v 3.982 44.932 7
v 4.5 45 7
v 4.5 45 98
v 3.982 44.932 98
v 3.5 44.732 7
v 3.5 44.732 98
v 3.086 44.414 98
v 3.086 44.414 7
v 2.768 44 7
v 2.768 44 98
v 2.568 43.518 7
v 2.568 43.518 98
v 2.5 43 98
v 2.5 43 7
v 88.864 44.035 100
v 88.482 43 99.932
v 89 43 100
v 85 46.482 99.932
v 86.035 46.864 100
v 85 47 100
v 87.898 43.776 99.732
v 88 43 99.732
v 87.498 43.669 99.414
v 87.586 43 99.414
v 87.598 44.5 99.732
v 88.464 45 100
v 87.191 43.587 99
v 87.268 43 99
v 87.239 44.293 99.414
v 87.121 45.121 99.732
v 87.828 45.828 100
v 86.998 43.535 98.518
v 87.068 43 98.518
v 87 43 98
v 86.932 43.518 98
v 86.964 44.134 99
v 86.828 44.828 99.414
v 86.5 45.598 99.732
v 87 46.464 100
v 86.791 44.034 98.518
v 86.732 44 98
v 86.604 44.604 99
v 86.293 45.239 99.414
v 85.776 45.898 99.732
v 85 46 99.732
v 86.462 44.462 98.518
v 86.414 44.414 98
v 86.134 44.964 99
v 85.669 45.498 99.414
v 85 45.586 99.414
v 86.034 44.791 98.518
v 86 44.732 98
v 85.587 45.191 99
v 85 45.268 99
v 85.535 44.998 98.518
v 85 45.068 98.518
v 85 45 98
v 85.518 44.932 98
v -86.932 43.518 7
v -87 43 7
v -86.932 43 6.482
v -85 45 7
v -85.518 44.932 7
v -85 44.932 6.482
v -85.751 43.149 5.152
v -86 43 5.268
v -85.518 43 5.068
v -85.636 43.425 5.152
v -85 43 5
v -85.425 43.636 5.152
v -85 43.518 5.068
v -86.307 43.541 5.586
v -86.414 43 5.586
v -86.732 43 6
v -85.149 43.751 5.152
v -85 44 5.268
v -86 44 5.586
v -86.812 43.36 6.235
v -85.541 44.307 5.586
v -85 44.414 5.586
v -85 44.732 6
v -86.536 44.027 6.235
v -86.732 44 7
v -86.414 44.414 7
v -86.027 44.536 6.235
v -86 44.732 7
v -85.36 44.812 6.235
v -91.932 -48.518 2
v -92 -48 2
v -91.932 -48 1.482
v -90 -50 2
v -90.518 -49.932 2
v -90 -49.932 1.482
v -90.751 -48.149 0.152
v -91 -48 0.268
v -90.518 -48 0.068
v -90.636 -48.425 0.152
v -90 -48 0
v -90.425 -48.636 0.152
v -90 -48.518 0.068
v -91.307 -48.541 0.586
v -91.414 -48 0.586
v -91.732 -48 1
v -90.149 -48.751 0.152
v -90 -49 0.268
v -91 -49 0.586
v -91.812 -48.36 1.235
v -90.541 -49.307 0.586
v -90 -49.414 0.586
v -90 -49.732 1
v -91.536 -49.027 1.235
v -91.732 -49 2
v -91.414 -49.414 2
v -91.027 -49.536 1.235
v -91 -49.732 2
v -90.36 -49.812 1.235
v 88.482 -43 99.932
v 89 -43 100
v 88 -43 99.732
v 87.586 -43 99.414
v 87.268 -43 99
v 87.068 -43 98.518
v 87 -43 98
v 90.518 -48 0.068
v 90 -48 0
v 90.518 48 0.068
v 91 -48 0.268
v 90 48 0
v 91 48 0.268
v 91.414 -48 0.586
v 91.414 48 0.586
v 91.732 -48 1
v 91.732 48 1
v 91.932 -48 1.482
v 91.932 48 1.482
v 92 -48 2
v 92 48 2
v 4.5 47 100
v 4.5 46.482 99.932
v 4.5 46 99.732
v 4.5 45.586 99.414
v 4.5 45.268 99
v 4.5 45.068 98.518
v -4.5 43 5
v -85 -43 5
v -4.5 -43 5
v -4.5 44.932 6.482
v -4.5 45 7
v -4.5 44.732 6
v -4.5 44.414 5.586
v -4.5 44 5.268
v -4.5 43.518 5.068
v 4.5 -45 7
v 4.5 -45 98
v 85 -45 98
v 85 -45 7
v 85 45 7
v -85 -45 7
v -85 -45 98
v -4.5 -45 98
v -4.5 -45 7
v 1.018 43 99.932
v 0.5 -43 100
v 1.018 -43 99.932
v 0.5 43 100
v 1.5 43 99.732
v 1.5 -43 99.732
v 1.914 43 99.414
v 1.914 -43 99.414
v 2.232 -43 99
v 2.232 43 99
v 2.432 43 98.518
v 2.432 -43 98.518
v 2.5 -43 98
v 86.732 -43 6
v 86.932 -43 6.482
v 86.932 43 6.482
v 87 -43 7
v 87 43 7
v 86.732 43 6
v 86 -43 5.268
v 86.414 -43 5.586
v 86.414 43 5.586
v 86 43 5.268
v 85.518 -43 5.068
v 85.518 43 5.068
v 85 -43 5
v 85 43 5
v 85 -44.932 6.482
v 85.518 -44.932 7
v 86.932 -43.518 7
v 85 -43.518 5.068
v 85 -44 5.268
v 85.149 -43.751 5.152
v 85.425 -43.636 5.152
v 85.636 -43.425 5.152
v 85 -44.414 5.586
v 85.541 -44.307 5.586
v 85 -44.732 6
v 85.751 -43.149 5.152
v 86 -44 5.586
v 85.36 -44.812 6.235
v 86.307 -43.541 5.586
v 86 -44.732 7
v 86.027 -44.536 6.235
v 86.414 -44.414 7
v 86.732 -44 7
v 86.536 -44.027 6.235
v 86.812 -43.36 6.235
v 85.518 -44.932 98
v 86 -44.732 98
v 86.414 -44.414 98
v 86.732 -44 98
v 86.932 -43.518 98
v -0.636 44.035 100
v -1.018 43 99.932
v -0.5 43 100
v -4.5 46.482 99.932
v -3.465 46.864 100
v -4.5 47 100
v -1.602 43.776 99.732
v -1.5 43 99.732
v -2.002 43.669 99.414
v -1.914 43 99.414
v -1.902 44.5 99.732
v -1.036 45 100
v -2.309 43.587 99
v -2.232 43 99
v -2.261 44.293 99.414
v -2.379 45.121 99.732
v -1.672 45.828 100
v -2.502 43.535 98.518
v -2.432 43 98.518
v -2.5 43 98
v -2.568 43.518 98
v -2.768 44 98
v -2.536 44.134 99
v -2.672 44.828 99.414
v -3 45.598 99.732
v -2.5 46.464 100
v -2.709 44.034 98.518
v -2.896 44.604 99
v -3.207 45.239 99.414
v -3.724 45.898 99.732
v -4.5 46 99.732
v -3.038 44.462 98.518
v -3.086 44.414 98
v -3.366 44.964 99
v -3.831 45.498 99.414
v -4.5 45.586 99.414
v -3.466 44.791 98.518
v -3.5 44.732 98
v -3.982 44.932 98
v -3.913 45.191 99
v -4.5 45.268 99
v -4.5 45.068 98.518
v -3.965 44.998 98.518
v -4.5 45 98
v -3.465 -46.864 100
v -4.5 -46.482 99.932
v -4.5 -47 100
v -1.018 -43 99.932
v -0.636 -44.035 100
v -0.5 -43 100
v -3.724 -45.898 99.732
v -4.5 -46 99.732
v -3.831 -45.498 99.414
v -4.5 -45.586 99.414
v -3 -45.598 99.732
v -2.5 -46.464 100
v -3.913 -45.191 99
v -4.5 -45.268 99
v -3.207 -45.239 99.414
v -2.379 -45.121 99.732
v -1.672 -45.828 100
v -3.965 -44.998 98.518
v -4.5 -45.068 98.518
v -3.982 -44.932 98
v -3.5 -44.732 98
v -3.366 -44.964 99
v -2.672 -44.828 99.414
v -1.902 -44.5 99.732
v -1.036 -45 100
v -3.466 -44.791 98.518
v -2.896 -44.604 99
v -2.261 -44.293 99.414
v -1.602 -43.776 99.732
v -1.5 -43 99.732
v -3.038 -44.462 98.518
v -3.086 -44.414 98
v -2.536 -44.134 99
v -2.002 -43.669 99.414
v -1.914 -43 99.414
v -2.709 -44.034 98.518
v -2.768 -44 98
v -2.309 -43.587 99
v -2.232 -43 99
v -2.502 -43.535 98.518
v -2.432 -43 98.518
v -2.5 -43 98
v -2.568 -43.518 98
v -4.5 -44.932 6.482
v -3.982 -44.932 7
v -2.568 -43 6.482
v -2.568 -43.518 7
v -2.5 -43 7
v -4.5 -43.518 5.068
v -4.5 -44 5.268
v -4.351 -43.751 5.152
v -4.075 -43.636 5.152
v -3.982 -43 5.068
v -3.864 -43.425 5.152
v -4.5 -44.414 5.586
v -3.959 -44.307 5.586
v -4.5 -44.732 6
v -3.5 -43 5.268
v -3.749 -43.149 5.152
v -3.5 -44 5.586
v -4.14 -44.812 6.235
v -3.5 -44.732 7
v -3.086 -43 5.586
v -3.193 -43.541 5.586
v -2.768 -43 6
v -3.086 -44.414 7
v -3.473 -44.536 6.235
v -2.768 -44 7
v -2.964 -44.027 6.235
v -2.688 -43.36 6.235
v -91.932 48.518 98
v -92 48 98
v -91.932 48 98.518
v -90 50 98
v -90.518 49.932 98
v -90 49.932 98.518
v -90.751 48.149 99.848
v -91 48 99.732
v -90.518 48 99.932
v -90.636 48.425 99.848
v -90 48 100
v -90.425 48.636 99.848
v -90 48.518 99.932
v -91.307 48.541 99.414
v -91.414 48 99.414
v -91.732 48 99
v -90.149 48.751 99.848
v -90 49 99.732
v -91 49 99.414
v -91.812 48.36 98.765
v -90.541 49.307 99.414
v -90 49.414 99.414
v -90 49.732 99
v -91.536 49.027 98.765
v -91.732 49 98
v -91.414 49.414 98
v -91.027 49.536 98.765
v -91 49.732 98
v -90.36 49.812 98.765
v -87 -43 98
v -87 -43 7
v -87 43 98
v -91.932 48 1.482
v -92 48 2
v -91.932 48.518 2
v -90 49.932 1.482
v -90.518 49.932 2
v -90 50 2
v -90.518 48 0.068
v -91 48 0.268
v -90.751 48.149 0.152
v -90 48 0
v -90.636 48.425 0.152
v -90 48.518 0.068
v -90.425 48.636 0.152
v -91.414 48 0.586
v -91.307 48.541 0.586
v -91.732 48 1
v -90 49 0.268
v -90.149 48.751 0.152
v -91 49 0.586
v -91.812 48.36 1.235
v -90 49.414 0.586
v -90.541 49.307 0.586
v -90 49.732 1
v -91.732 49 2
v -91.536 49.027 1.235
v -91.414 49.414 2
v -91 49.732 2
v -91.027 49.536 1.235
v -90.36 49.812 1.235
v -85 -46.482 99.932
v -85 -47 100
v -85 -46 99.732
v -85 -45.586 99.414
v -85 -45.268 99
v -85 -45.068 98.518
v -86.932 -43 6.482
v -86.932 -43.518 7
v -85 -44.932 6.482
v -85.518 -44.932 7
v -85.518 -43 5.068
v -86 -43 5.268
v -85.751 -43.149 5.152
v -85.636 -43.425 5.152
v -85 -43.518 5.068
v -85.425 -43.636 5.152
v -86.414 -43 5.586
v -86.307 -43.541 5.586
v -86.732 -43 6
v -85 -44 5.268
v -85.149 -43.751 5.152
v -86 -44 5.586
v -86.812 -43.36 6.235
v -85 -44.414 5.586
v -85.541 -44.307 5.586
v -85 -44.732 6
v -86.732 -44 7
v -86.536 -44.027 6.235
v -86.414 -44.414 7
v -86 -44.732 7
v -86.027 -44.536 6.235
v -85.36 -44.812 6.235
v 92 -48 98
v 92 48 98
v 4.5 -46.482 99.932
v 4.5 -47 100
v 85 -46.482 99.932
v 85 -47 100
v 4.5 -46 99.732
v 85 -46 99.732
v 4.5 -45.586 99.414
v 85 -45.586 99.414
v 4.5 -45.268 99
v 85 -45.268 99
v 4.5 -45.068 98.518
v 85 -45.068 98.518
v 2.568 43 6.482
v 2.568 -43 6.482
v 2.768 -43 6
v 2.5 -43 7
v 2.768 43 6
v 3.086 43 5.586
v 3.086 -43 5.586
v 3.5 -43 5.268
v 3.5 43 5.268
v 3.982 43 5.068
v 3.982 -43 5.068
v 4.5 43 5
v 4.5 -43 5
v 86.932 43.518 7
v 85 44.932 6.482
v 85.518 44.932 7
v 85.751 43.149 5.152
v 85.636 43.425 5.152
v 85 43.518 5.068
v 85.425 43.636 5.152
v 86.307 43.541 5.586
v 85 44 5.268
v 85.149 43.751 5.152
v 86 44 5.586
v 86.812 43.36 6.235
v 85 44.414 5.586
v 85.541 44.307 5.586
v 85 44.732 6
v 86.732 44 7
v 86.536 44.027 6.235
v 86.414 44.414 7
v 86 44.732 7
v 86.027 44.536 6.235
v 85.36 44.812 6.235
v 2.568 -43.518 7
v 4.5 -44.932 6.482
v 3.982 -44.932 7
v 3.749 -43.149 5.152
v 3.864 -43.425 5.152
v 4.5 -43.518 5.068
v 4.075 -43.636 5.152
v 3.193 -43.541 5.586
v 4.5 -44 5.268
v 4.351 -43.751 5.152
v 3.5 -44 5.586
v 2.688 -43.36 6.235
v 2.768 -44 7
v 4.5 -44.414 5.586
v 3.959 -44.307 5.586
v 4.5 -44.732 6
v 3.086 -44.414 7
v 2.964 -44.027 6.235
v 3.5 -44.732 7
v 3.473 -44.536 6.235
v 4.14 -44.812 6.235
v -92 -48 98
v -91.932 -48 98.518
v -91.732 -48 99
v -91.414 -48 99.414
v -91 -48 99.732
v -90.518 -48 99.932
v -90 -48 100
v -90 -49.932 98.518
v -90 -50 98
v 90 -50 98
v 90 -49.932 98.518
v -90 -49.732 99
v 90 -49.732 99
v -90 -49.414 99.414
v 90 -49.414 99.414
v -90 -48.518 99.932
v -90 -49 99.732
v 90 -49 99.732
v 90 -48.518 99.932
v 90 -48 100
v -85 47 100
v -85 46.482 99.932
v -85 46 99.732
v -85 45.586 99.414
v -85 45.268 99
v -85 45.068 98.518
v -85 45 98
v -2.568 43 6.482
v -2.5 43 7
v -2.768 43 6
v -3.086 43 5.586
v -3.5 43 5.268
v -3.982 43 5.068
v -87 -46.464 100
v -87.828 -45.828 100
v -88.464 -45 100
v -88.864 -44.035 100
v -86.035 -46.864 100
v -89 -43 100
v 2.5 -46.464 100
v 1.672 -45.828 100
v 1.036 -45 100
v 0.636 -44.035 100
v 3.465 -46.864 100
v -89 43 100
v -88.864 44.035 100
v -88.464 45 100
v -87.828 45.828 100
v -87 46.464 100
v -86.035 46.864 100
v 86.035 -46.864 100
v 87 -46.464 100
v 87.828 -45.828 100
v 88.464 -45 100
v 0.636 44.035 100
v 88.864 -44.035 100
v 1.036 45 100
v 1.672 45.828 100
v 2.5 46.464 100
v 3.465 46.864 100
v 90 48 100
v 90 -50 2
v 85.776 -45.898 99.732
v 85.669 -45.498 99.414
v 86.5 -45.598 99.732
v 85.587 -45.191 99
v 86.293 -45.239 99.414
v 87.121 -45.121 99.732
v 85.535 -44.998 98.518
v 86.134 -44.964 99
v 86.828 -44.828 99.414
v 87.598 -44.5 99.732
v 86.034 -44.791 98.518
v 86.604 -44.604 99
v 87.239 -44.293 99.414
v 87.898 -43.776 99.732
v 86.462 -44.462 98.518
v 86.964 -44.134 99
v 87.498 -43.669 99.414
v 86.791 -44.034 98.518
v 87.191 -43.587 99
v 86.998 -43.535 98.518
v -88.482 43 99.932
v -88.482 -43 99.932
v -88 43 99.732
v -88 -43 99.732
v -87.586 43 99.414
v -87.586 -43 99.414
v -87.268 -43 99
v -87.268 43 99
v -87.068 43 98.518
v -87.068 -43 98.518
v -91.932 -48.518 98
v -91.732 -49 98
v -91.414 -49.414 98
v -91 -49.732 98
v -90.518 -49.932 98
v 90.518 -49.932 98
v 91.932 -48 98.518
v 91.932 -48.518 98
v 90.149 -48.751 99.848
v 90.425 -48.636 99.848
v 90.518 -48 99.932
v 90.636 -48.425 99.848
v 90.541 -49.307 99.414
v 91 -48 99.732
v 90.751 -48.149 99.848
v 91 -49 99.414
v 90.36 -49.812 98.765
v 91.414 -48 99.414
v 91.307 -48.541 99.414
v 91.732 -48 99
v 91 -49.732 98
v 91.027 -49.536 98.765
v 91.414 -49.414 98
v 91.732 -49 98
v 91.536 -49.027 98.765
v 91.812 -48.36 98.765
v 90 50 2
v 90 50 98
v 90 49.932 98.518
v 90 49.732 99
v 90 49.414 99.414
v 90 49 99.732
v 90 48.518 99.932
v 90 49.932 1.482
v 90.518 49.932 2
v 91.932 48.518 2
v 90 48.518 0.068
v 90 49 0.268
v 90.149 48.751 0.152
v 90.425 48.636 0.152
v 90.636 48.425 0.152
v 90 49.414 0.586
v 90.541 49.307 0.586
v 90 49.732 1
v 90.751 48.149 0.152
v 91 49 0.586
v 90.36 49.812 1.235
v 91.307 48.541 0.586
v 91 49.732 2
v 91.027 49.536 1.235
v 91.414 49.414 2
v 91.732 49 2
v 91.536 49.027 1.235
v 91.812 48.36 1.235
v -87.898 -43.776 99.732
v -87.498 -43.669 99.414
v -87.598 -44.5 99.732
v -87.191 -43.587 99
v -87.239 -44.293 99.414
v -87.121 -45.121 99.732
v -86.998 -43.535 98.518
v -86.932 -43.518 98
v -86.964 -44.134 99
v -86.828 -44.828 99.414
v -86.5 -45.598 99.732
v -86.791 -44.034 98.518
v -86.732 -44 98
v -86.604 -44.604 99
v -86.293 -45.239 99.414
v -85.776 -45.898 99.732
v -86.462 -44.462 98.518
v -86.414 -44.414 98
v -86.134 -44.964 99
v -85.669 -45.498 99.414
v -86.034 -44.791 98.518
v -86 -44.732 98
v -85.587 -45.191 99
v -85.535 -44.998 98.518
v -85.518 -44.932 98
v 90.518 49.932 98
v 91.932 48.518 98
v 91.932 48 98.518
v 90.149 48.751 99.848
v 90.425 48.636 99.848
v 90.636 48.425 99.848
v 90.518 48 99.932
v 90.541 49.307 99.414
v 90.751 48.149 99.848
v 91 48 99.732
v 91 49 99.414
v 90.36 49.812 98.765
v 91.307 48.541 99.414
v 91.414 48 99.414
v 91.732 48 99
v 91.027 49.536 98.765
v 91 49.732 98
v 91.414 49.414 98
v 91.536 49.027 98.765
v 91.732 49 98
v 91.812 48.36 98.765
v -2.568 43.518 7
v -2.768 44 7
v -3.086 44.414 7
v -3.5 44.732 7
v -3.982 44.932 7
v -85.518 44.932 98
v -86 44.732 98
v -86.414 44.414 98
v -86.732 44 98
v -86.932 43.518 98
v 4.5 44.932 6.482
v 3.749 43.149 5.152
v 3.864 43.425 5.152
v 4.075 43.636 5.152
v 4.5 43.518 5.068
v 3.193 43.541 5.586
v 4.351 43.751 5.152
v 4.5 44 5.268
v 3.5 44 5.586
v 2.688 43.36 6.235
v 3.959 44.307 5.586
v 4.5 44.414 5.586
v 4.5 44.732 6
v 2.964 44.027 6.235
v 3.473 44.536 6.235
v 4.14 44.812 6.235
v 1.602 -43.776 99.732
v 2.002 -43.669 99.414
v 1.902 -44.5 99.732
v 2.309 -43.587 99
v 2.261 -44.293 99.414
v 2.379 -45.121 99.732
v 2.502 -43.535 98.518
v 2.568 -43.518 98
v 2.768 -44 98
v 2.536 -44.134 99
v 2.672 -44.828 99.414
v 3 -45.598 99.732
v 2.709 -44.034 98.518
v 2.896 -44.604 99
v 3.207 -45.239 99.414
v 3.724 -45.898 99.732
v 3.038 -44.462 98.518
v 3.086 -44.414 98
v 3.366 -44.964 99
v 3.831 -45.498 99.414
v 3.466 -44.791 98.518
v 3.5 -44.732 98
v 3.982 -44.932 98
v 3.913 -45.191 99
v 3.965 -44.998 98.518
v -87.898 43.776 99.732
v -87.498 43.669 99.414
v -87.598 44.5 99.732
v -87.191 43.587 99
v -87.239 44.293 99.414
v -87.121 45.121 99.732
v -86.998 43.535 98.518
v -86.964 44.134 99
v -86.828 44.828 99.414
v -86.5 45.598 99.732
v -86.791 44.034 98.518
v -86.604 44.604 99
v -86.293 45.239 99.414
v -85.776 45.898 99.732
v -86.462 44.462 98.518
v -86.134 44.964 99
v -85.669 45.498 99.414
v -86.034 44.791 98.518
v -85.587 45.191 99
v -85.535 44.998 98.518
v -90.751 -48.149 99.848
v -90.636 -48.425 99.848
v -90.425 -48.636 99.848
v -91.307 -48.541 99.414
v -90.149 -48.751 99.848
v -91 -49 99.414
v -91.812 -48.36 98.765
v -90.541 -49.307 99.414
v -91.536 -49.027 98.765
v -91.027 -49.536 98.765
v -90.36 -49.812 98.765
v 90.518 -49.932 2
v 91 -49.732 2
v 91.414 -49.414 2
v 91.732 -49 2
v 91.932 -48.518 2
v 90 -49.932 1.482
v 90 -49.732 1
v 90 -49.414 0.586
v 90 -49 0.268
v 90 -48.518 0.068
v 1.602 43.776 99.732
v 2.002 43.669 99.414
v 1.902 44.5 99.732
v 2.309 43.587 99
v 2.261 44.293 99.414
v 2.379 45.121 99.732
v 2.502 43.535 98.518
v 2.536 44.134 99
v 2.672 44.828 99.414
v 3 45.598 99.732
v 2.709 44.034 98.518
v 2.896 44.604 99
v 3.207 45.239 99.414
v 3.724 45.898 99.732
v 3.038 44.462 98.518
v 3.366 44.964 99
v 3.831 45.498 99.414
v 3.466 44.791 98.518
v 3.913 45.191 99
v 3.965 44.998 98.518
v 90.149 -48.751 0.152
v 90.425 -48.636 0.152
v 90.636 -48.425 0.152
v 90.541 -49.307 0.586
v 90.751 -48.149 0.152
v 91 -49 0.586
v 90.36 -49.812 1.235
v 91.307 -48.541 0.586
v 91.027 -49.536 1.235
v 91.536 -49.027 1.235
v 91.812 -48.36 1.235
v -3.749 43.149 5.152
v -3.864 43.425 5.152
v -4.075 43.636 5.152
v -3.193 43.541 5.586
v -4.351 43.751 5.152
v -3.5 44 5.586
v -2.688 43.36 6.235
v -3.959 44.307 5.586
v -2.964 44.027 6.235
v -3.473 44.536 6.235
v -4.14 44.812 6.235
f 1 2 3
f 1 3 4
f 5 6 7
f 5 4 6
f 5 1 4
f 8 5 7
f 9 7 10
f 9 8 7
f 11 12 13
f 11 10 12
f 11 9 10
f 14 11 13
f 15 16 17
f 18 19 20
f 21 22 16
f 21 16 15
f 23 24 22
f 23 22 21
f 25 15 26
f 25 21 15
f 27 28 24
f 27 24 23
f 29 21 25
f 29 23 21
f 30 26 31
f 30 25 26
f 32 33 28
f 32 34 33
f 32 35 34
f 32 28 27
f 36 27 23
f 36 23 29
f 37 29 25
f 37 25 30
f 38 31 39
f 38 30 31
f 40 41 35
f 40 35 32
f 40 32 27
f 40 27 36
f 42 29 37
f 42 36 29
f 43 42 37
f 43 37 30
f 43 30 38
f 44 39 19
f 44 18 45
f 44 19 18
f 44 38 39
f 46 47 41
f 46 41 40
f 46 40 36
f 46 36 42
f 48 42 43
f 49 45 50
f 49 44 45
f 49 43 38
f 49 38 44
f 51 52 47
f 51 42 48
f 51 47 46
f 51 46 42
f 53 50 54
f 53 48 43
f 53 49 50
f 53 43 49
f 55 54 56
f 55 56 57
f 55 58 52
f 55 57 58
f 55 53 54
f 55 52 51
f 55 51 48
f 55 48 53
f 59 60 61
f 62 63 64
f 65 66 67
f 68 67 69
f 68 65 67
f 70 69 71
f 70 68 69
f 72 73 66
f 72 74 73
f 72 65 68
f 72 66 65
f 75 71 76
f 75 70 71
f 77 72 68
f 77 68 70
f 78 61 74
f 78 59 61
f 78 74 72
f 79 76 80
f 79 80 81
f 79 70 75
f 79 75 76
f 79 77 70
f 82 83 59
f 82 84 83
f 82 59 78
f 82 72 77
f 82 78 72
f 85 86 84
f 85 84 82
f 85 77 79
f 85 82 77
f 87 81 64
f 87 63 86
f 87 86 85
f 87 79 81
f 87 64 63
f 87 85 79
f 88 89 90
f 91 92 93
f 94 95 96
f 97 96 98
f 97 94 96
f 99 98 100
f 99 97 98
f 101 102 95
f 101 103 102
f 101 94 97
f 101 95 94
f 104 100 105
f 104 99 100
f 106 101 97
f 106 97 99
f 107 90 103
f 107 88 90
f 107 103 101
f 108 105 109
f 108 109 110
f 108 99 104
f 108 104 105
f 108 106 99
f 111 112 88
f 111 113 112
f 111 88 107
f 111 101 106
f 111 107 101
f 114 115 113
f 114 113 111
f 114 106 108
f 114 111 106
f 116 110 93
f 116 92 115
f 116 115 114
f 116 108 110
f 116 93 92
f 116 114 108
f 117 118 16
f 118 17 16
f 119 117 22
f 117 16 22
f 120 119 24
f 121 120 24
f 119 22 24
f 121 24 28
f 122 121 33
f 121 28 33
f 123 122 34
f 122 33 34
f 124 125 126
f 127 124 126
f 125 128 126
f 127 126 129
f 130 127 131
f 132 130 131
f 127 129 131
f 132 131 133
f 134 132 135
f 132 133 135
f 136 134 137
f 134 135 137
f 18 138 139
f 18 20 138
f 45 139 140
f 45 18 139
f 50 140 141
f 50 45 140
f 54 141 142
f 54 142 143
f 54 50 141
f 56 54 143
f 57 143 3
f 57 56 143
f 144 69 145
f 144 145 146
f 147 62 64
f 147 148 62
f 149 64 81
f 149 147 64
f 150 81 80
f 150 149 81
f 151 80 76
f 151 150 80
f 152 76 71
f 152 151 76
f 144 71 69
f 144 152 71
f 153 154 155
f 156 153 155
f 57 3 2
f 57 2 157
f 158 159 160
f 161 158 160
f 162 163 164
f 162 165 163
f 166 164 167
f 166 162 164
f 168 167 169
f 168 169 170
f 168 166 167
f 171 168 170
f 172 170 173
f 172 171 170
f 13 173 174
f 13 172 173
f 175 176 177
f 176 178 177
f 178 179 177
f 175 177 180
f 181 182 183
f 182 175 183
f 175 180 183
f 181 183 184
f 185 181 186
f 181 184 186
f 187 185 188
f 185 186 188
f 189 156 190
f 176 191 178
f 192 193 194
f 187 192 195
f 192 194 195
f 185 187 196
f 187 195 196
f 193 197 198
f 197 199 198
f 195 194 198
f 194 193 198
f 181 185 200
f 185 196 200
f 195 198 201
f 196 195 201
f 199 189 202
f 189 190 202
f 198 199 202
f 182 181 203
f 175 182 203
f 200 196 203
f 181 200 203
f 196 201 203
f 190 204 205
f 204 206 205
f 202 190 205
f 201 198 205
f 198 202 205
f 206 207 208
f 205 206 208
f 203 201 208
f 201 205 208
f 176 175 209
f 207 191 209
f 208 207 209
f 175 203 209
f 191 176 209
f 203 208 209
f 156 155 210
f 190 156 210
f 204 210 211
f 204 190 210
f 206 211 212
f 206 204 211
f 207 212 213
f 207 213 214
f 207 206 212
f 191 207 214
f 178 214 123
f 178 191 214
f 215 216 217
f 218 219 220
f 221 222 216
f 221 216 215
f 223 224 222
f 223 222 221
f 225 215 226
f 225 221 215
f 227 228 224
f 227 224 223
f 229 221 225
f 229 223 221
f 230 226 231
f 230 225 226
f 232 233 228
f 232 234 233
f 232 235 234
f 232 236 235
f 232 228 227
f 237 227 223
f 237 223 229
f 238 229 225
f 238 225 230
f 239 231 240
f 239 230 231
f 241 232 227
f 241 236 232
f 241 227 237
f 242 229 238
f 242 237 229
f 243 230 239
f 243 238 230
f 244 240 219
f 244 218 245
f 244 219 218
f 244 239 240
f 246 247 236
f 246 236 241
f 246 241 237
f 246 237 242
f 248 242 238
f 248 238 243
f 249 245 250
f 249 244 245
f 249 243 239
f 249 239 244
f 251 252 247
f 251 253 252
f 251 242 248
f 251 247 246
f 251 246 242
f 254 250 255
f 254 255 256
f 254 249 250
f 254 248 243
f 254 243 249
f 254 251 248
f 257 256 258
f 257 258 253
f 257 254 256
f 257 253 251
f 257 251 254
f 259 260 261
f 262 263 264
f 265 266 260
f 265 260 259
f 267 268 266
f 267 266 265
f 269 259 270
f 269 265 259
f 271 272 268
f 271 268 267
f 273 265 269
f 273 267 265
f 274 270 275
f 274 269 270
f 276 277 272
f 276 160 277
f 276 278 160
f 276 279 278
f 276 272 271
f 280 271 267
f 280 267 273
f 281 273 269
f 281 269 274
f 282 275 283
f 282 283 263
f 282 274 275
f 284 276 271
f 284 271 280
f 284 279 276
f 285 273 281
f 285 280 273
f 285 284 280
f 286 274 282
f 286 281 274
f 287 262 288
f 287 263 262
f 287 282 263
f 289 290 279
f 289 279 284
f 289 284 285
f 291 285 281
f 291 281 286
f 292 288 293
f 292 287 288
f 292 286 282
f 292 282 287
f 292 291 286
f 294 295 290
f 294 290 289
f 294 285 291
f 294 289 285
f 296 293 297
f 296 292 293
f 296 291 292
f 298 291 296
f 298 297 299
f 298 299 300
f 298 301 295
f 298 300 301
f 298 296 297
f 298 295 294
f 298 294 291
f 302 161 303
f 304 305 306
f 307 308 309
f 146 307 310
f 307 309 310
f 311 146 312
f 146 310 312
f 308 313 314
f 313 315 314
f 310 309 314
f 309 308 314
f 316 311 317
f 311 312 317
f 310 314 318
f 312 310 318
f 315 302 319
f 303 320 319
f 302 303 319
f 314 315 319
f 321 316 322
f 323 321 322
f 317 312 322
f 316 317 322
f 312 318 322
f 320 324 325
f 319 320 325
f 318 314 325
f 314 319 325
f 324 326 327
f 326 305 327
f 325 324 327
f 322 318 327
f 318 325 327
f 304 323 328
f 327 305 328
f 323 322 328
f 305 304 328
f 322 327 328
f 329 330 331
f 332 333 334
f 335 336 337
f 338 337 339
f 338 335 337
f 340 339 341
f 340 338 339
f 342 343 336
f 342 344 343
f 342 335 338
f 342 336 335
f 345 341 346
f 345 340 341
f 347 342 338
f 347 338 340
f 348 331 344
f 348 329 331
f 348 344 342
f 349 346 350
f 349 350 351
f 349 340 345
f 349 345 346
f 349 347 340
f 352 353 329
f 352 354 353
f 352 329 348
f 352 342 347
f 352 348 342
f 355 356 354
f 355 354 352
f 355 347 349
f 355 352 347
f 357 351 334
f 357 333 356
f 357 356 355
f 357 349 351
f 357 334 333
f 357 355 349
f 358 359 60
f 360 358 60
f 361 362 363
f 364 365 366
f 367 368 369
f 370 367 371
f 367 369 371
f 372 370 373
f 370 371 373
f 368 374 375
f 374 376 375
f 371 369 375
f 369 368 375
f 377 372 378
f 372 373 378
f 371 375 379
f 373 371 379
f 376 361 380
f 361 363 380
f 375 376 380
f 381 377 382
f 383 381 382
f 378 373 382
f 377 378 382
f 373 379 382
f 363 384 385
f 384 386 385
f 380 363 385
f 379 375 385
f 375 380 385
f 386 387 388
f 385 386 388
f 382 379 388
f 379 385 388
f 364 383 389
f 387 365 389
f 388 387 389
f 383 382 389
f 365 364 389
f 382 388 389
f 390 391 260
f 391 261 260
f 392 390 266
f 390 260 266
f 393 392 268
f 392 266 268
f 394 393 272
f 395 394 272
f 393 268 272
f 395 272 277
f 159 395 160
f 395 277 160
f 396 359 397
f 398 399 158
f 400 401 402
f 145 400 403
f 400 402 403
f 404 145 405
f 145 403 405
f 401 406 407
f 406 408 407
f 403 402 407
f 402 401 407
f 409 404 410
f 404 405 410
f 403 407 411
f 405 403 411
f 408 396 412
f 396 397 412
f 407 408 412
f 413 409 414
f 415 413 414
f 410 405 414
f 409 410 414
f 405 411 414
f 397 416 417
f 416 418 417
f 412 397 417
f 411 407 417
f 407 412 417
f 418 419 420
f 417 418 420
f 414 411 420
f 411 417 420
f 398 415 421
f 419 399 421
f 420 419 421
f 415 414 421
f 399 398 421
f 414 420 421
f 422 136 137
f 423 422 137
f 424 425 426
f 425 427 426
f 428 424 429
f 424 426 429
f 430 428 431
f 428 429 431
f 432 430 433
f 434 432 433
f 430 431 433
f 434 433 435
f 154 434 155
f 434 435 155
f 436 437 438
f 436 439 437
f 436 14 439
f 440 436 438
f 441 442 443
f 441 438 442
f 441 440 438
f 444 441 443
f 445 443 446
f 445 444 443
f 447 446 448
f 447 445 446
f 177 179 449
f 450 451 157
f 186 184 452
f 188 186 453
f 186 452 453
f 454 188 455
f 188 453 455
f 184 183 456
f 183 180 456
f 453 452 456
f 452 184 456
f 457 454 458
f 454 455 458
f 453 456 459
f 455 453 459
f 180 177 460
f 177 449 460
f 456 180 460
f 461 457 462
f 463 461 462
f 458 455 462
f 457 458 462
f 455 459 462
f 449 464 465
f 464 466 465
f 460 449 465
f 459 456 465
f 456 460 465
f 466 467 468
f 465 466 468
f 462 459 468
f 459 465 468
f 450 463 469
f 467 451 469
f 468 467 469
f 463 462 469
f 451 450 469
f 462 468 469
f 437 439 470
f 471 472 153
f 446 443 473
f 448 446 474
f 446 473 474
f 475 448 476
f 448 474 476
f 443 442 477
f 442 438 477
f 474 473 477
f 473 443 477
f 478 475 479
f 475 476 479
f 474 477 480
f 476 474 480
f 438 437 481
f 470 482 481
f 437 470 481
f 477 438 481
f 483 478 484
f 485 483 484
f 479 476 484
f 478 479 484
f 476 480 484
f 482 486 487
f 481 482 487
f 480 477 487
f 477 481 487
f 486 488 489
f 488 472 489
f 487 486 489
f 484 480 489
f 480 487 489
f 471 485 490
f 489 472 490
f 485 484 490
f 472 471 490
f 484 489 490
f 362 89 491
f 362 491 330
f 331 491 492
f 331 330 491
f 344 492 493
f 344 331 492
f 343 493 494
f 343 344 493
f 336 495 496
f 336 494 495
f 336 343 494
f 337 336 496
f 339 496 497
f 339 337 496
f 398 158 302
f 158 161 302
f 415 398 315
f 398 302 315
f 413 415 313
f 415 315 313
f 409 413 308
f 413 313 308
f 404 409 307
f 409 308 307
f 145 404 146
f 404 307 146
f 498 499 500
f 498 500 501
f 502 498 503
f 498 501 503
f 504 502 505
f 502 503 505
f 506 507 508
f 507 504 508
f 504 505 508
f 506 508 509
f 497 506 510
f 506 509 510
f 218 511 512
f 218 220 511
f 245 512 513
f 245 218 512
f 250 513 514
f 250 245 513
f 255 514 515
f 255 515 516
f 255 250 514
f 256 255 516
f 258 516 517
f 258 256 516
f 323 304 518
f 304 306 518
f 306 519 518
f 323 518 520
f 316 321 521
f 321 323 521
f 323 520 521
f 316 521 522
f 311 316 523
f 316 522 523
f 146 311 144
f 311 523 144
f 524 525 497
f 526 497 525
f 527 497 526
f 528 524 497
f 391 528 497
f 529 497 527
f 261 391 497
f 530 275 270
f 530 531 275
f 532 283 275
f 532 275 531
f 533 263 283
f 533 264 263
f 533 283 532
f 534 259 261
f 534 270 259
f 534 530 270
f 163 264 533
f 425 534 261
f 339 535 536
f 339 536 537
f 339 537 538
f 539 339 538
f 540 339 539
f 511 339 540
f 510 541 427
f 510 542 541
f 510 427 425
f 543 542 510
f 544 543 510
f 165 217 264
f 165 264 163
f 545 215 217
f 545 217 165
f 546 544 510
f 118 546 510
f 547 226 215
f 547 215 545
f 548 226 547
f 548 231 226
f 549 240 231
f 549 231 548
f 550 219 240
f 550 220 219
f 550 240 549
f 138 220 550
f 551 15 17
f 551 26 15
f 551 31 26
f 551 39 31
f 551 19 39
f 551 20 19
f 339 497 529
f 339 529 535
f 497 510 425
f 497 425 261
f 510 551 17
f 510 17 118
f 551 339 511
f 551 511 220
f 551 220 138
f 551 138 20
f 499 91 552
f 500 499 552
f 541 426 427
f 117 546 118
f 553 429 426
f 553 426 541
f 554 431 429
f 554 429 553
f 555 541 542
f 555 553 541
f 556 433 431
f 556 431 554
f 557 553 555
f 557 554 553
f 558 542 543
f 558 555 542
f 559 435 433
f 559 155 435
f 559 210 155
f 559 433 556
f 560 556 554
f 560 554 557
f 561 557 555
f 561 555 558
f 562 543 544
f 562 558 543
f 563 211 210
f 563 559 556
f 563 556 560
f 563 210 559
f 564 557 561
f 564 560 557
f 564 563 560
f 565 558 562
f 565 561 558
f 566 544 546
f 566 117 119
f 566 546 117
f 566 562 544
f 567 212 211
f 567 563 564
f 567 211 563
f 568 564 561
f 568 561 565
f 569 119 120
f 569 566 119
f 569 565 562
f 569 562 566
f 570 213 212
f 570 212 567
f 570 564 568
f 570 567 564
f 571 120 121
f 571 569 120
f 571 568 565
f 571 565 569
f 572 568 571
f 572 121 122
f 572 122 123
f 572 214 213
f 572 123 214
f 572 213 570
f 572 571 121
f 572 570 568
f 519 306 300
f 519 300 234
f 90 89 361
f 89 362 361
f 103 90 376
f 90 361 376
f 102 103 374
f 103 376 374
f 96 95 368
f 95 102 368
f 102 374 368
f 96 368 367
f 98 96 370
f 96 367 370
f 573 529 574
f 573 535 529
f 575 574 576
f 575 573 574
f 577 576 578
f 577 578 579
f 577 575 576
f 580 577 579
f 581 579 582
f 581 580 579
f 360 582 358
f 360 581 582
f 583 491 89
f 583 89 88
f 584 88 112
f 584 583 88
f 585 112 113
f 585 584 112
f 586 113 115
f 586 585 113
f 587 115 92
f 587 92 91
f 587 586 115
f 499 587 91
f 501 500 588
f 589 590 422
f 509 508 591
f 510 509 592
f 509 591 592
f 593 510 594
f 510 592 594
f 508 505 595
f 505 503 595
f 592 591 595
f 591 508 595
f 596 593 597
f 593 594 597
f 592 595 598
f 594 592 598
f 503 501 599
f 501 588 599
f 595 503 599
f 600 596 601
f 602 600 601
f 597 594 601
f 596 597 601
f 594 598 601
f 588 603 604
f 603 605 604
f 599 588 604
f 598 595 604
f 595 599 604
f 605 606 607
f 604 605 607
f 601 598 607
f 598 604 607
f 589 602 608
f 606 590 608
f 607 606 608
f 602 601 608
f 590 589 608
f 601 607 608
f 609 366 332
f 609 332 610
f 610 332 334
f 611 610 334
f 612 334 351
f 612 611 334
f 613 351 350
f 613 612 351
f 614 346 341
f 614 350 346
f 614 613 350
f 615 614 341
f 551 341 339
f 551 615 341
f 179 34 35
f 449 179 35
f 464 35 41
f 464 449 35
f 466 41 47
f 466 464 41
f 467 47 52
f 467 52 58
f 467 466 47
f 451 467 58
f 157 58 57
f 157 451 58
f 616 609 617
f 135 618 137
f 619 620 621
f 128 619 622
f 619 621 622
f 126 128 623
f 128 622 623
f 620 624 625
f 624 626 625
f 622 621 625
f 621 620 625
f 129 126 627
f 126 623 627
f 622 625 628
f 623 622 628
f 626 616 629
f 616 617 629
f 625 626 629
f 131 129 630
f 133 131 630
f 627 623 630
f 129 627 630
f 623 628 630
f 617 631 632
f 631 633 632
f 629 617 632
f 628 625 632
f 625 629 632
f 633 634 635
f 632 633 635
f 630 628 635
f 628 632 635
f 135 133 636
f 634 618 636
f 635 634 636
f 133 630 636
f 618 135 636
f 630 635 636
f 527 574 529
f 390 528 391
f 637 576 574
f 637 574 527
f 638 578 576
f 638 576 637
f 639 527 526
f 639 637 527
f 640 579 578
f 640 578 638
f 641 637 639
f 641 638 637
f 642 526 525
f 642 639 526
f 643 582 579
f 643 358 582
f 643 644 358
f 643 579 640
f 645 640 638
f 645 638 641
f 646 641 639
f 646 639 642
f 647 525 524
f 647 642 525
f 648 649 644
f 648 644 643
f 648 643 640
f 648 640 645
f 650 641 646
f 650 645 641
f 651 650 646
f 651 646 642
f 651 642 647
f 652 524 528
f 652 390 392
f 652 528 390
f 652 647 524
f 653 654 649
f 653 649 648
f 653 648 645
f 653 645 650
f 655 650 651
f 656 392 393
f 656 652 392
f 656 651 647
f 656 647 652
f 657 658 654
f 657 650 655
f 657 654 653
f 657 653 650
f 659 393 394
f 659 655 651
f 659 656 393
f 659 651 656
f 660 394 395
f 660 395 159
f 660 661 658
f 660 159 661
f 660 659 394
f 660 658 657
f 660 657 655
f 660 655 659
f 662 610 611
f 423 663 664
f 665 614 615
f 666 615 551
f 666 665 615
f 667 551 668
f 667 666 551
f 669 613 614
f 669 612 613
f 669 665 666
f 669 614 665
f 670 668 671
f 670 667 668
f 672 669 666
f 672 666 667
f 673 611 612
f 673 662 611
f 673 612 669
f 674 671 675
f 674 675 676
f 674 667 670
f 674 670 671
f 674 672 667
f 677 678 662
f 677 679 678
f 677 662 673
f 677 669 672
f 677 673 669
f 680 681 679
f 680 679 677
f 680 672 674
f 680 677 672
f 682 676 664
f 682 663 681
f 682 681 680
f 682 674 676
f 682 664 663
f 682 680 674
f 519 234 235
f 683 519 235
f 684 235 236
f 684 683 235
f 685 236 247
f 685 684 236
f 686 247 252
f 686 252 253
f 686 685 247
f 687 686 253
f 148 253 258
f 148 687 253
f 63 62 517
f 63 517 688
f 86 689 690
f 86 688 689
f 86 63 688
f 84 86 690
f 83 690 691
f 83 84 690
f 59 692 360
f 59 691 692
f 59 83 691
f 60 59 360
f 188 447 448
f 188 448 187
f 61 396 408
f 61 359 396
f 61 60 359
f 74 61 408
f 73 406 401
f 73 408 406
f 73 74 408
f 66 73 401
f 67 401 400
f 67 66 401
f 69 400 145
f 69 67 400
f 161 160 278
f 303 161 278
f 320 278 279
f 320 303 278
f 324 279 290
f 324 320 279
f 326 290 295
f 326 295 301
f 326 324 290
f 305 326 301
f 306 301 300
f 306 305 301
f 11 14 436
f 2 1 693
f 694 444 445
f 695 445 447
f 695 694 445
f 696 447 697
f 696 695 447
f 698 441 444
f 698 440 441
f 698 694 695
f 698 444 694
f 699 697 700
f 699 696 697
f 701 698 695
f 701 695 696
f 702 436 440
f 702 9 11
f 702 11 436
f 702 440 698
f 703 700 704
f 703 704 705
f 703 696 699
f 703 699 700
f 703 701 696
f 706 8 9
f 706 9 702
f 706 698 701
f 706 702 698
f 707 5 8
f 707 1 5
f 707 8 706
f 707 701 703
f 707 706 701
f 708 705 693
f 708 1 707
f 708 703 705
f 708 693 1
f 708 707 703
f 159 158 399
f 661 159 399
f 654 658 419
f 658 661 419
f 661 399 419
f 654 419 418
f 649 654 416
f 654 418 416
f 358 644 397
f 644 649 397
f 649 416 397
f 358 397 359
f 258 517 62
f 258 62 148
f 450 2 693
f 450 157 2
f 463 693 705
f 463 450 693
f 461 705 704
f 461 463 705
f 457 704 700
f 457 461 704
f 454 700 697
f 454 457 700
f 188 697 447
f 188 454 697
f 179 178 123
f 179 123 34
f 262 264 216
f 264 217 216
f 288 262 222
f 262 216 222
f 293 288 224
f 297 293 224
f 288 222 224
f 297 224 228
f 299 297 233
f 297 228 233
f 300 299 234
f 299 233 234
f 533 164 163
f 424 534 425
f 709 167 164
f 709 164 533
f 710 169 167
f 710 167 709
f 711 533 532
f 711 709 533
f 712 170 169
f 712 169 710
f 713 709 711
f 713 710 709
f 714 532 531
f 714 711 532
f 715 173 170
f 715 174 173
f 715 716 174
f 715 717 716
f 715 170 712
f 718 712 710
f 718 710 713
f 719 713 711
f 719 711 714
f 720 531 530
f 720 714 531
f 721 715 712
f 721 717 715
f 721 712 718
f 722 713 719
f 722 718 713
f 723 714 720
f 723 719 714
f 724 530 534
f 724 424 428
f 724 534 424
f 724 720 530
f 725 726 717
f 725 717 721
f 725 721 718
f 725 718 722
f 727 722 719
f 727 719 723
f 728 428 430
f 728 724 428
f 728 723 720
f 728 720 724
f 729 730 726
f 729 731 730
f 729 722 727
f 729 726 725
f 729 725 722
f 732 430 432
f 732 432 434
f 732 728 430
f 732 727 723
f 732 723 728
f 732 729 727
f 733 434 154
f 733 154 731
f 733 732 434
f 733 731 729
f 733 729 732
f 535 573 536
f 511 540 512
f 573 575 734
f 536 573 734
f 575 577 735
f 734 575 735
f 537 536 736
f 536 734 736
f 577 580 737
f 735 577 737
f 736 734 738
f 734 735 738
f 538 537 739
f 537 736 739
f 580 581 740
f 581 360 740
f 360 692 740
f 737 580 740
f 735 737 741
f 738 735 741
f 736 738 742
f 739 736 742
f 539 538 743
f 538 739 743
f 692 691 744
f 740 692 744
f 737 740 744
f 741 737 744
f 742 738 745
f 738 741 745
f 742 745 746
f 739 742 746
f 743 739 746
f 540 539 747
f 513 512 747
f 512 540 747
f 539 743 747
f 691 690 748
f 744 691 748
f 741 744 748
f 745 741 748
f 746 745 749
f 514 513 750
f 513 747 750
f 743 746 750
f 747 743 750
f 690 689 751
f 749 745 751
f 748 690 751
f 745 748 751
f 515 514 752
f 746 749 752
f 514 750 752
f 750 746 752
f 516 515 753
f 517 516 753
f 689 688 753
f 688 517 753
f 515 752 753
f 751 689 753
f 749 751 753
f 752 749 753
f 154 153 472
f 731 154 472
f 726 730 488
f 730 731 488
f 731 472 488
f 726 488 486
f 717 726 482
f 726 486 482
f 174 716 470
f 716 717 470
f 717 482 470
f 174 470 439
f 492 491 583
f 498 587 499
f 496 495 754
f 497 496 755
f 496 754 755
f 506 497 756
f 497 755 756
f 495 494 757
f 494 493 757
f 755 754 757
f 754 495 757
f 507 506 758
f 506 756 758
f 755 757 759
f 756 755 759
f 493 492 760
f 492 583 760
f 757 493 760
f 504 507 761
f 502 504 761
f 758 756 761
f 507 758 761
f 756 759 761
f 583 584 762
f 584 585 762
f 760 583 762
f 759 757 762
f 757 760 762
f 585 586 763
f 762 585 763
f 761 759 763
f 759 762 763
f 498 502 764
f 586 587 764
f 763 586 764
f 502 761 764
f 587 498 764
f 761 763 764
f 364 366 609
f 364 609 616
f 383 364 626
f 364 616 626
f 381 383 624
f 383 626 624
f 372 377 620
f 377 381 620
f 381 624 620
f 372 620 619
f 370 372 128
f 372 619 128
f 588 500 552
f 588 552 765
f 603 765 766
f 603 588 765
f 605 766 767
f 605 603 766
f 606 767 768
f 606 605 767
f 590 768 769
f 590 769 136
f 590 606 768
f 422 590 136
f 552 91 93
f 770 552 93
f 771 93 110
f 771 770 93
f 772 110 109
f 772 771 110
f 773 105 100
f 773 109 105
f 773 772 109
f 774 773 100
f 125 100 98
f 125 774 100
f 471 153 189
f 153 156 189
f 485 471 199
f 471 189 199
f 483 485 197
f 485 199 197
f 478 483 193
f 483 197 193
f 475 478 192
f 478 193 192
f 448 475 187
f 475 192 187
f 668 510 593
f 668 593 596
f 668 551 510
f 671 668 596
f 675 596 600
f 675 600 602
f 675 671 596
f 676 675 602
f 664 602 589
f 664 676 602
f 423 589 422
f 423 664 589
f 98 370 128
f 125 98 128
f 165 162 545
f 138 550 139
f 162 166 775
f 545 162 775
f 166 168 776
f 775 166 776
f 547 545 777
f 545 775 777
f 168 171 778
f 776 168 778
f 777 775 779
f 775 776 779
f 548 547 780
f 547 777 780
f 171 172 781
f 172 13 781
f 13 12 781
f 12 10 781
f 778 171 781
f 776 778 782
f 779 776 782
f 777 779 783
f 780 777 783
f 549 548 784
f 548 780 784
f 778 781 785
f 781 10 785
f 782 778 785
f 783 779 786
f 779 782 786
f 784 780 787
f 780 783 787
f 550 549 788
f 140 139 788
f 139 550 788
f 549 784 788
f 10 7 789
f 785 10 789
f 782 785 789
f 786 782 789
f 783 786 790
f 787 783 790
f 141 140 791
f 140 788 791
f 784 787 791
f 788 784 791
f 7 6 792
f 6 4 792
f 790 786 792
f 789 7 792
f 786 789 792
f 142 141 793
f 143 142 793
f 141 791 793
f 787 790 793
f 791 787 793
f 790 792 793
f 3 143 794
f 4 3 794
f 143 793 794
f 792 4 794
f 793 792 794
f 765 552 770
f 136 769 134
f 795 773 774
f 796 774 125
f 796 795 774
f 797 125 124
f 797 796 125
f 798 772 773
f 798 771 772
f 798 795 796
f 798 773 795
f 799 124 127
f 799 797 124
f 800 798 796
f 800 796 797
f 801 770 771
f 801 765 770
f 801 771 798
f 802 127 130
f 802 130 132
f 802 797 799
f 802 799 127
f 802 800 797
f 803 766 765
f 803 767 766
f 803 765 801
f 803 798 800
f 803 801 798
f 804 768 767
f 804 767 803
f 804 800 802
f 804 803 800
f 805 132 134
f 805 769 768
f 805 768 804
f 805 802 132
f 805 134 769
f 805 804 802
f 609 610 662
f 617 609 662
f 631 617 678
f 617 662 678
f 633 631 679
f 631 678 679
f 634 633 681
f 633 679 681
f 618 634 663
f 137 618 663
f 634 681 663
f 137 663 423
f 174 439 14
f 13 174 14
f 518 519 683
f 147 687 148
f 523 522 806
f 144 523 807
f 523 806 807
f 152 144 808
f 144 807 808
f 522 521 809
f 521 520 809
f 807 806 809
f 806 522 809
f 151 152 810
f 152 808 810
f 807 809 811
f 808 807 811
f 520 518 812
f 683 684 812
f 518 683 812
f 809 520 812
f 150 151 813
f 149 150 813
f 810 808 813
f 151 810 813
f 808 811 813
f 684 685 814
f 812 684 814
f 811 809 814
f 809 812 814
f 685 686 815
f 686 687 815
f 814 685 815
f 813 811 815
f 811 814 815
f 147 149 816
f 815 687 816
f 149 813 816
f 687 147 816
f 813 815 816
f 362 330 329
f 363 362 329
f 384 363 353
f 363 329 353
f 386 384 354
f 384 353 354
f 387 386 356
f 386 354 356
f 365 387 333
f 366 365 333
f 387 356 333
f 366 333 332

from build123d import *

# Parameters (mm, degrees)
SKETCH_W     = 184
SKETCH_H     = 100
PAD_DEPTH    = 100
SKETCH001_W  = 84.5
SKETCH001_H  = 90
POCKET_DEPTH = 95
FILLET_R     = 2


with BuildPart() as part:
    # Sketch → Pad (new body)
    with BuildSketch(Plane.XY):
        Rectangle(SKETCH_W, SKETCH_H)
    extrude(amount=PAD_DEPTH)

    # Sketch001 (on Face6 of Pad) → Pocket (cut)
    with BuildSketch(Plane.XY.offset(100)):
        with Locations((-44.75, 0)):
            Rectangle(SKETCH001_W, SKETCH001_H)
        with Locations((44.75, 0)):
            Rectangle(SKETCH001_W, SKETCH001_H)
    extrude(amount=-POCKET_DEPTH, mode=Mode.SUBTRACT)

    # Fillet
    fillet_edges = [part.edges().sort_by_distance(p)[0] for p in [
        (-92, 50, 50),
        (-92, -50, 50),
        (-92, 0, 0),
        (-92, 0, 100),
        (92, 50, 50),
        (0, 50, 0),
        (0, 50, 100),
        (92, -50, 50),
        (0, -50, 0),
        (0, -50, 100),
        (92, 0, 0),
        (92, 0, 100),
        (-87, 0, 100),
        (-44.75, -45, 100),
        (-2.5, 0, 100),
        (-44.75, 45, 100),
        (2.5, 0, 100),
        (44.75, -45, 100),
        (87, 0, 100),
        (44.75, 45, 100),
        (-87, 45, 52.5),
        (-87, -45, 52.5),
        (-87, 0, 5),
        (-2.5, -45, 52.5),
        (-44.75, -45, 5),
        (-2.5, 45, 52.5),
        (-2.5, 0, 5),
        (-44.75, 45, 5),
        (2.5, 45, 52.5),
        (2.5, -45, 52.5),
        (2.5, 0, 5),
        (87, -45, 52.5),
        (44.75, -45, 5),
        (87, 45, 52.5),
        (87, 0, 5),
        (44.75, 45, 5),
    ]]
    fillet(fillet_edges, radius=FILLET_R)


solid = part.part
